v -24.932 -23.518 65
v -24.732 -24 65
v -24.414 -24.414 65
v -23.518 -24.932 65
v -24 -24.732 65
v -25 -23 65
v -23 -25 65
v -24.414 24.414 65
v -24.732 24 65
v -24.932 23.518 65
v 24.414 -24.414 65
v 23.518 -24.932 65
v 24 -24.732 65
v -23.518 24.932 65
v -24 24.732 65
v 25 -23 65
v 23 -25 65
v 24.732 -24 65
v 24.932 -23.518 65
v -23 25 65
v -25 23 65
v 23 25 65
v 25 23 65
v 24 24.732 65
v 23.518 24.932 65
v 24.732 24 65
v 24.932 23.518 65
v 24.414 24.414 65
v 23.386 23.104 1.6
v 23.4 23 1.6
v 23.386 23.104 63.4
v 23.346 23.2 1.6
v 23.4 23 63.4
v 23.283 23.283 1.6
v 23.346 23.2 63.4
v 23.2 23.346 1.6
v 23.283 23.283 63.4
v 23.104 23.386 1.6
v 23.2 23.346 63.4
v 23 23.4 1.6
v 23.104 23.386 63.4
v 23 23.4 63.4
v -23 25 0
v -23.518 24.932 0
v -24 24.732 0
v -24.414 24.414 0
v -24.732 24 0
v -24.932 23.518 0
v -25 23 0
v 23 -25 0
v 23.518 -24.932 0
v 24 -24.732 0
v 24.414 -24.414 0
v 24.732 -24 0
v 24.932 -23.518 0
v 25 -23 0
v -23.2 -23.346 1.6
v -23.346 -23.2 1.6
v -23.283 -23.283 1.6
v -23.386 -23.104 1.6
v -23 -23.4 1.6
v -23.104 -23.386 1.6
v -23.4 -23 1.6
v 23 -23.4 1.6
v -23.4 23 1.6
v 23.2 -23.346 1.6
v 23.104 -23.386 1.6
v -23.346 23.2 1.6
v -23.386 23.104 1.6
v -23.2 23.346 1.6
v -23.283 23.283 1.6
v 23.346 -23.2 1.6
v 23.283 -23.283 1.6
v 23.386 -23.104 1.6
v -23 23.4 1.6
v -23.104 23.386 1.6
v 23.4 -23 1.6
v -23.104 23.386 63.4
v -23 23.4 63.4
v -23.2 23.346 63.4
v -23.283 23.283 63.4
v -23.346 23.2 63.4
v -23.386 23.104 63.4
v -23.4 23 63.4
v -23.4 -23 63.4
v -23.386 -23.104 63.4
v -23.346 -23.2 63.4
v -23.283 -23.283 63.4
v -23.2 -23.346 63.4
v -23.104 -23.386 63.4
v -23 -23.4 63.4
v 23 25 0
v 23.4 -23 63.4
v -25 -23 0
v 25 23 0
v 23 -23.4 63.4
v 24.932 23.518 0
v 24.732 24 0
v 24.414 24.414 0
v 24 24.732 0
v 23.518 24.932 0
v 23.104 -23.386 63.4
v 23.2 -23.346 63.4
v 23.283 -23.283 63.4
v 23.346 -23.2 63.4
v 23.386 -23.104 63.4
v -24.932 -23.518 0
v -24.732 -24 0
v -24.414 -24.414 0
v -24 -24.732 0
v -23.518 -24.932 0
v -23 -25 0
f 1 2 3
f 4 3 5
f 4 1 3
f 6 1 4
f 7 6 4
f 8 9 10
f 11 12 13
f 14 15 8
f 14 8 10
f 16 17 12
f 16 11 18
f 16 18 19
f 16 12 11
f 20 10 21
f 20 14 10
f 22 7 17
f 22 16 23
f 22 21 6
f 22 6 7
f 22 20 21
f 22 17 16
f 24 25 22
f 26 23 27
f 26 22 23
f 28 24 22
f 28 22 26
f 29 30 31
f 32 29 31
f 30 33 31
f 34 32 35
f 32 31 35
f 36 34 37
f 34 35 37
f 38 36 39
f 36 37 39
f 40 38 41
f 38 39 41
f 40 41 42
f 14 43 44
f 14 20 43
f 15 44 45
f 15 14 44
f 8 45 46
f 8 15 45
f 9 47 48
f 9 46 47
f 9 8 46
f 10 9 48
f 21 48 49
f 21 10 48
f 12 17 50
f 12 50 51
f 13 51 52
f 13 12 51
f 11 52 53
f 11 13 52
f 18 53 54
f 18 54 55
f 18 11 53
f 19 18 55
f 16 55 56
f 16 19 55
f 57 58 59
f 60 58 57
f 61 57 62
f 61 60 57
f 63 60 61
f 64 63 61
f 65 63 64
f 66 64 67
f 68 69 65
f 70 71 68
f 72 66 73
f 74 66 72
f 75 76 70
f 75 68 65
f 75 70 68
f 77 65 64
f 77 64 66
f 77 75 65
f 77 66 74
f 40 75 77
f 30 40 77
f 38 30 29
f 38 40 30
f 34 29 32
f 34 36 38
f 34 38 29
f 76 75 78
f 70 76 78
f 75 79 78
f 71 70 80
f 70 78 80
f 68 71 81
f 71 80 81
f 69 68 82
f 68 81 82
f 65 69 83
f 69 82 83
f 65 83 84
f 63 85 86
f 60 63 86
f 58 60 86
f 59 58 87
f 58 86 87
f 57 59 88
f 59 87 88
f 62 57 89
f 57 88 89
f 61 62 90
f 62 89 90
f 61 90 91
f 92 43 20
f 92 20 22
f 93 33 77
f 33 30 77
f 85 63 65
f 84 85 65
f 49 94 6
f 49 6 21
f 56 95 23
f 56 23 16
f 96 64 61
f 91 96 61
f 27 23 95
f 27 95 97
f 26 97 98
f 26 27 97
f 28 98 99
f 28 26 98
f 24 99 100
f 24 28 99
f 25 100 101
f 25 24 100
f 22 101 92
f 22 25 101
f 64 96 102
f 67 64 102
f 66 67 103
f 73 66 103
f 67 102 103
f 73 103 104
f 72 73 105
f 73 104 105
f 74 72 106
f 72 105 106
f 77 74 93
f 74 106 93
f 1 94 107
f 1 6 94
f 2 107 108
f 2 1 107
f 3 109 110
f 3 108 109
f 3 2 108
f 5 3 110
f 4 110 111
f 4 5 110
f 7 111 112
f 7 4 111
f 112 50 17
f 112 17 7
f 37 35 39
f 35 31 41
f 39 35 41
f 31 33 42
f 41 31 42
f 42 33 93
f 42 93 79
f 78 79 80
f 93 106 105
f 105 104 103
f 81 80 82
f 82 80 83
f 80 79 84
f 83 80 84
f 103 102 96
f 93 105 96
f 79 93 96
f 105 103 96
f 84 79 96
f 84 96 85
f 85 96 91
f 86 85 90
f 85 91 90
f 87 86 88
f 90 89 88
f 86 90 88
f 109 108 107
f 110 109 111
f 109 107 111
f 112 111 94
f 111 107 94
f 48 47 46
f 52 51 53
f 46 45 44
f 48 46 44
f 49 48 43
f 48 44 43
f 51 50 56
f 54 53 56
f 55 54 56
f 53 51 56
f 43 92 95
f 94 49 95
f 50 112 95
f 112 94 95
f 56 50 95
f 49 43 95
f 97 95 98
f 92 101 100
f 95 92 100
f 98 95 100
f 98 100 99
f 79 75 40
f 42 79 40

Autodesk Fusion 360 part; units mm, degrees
sketch "Sketch1" plane through (0, 0, 0) normal (0, 0, 1) x (1, 0, 0)
  line L0 (25, -25) -> (-25, -25)
  line L1 (-25, -25) -> (-25, 25)
  line L2 (-25, 25) -> (25, 25)
  line L3 (25, 25) -> (25, -25)
  line L4 (25, -25) -> (-25, 25) construction
  line L5 (-25, -25) -> (25, 25) construction
  dimension "d1" = 50
  dimension "d2" = 50
extrude "Extrude1" add sketch "Sketch1" along normal blind 65
fillet "Fillet1" radius 2 4 edges at (-25, -25, 32.5) (25, -25, 32.5) (-25, 25, 32.5) (25, 25, 32.5)
shell "Shell1" thickness 1.6 removed faces 1 at (7.6667, -8.3333, 65)
sketch "Sketch2" plane through (0, 0, 65) normal (0, 0, 1) x (-1, 0, 0)
  arc A0 (-23, 23.4) -> (-23.4, 23) centre (-23, 23) ccw
  line L0 (-23, 23.4) -> (23, 23.4)
  arc A1 (23.4, 23) -> (23, 23.4) centre (23, 23) ccw
  line L1 (23.4, 23) -> (23.4, -23)
  arc A2 (23, -23.4) -> (23.4, -23) centre (23, -23) ccw
  line L2 (23, -23.4) -> (-23, -23.4)
  arc A3 (-23.4, -23) -> (-23, -23.4) centre (-23, -23) ccw
  line L3 (-23.4, -23) -> (-23.4, 23)
  arc A4 (-25, -23) -> (-23, -25) centre (-23, -23) ccw
  line L4 (-23, -25) -> (23, -25)
  arc A5 (23, -25) -> (25, -23) centre (23, -23) ccw
  line L5 (25, -23) -> (25, 23)
  arc A6 (25, 23) -> (23, 25) centre (23, 23) ccw
  line L6 (23, 25) -> (-23, 25)
  arc A7 (-23, 25) -> (-25, 23) centre (-23, 23) ccw
  line L7 (-25, 23) -> (-25, -23)
extrude "Extrude2" add sketch "Sketch2" against normal blind 1.6 contours A0 L0 A1 L1 A2 L2 A3 L3
